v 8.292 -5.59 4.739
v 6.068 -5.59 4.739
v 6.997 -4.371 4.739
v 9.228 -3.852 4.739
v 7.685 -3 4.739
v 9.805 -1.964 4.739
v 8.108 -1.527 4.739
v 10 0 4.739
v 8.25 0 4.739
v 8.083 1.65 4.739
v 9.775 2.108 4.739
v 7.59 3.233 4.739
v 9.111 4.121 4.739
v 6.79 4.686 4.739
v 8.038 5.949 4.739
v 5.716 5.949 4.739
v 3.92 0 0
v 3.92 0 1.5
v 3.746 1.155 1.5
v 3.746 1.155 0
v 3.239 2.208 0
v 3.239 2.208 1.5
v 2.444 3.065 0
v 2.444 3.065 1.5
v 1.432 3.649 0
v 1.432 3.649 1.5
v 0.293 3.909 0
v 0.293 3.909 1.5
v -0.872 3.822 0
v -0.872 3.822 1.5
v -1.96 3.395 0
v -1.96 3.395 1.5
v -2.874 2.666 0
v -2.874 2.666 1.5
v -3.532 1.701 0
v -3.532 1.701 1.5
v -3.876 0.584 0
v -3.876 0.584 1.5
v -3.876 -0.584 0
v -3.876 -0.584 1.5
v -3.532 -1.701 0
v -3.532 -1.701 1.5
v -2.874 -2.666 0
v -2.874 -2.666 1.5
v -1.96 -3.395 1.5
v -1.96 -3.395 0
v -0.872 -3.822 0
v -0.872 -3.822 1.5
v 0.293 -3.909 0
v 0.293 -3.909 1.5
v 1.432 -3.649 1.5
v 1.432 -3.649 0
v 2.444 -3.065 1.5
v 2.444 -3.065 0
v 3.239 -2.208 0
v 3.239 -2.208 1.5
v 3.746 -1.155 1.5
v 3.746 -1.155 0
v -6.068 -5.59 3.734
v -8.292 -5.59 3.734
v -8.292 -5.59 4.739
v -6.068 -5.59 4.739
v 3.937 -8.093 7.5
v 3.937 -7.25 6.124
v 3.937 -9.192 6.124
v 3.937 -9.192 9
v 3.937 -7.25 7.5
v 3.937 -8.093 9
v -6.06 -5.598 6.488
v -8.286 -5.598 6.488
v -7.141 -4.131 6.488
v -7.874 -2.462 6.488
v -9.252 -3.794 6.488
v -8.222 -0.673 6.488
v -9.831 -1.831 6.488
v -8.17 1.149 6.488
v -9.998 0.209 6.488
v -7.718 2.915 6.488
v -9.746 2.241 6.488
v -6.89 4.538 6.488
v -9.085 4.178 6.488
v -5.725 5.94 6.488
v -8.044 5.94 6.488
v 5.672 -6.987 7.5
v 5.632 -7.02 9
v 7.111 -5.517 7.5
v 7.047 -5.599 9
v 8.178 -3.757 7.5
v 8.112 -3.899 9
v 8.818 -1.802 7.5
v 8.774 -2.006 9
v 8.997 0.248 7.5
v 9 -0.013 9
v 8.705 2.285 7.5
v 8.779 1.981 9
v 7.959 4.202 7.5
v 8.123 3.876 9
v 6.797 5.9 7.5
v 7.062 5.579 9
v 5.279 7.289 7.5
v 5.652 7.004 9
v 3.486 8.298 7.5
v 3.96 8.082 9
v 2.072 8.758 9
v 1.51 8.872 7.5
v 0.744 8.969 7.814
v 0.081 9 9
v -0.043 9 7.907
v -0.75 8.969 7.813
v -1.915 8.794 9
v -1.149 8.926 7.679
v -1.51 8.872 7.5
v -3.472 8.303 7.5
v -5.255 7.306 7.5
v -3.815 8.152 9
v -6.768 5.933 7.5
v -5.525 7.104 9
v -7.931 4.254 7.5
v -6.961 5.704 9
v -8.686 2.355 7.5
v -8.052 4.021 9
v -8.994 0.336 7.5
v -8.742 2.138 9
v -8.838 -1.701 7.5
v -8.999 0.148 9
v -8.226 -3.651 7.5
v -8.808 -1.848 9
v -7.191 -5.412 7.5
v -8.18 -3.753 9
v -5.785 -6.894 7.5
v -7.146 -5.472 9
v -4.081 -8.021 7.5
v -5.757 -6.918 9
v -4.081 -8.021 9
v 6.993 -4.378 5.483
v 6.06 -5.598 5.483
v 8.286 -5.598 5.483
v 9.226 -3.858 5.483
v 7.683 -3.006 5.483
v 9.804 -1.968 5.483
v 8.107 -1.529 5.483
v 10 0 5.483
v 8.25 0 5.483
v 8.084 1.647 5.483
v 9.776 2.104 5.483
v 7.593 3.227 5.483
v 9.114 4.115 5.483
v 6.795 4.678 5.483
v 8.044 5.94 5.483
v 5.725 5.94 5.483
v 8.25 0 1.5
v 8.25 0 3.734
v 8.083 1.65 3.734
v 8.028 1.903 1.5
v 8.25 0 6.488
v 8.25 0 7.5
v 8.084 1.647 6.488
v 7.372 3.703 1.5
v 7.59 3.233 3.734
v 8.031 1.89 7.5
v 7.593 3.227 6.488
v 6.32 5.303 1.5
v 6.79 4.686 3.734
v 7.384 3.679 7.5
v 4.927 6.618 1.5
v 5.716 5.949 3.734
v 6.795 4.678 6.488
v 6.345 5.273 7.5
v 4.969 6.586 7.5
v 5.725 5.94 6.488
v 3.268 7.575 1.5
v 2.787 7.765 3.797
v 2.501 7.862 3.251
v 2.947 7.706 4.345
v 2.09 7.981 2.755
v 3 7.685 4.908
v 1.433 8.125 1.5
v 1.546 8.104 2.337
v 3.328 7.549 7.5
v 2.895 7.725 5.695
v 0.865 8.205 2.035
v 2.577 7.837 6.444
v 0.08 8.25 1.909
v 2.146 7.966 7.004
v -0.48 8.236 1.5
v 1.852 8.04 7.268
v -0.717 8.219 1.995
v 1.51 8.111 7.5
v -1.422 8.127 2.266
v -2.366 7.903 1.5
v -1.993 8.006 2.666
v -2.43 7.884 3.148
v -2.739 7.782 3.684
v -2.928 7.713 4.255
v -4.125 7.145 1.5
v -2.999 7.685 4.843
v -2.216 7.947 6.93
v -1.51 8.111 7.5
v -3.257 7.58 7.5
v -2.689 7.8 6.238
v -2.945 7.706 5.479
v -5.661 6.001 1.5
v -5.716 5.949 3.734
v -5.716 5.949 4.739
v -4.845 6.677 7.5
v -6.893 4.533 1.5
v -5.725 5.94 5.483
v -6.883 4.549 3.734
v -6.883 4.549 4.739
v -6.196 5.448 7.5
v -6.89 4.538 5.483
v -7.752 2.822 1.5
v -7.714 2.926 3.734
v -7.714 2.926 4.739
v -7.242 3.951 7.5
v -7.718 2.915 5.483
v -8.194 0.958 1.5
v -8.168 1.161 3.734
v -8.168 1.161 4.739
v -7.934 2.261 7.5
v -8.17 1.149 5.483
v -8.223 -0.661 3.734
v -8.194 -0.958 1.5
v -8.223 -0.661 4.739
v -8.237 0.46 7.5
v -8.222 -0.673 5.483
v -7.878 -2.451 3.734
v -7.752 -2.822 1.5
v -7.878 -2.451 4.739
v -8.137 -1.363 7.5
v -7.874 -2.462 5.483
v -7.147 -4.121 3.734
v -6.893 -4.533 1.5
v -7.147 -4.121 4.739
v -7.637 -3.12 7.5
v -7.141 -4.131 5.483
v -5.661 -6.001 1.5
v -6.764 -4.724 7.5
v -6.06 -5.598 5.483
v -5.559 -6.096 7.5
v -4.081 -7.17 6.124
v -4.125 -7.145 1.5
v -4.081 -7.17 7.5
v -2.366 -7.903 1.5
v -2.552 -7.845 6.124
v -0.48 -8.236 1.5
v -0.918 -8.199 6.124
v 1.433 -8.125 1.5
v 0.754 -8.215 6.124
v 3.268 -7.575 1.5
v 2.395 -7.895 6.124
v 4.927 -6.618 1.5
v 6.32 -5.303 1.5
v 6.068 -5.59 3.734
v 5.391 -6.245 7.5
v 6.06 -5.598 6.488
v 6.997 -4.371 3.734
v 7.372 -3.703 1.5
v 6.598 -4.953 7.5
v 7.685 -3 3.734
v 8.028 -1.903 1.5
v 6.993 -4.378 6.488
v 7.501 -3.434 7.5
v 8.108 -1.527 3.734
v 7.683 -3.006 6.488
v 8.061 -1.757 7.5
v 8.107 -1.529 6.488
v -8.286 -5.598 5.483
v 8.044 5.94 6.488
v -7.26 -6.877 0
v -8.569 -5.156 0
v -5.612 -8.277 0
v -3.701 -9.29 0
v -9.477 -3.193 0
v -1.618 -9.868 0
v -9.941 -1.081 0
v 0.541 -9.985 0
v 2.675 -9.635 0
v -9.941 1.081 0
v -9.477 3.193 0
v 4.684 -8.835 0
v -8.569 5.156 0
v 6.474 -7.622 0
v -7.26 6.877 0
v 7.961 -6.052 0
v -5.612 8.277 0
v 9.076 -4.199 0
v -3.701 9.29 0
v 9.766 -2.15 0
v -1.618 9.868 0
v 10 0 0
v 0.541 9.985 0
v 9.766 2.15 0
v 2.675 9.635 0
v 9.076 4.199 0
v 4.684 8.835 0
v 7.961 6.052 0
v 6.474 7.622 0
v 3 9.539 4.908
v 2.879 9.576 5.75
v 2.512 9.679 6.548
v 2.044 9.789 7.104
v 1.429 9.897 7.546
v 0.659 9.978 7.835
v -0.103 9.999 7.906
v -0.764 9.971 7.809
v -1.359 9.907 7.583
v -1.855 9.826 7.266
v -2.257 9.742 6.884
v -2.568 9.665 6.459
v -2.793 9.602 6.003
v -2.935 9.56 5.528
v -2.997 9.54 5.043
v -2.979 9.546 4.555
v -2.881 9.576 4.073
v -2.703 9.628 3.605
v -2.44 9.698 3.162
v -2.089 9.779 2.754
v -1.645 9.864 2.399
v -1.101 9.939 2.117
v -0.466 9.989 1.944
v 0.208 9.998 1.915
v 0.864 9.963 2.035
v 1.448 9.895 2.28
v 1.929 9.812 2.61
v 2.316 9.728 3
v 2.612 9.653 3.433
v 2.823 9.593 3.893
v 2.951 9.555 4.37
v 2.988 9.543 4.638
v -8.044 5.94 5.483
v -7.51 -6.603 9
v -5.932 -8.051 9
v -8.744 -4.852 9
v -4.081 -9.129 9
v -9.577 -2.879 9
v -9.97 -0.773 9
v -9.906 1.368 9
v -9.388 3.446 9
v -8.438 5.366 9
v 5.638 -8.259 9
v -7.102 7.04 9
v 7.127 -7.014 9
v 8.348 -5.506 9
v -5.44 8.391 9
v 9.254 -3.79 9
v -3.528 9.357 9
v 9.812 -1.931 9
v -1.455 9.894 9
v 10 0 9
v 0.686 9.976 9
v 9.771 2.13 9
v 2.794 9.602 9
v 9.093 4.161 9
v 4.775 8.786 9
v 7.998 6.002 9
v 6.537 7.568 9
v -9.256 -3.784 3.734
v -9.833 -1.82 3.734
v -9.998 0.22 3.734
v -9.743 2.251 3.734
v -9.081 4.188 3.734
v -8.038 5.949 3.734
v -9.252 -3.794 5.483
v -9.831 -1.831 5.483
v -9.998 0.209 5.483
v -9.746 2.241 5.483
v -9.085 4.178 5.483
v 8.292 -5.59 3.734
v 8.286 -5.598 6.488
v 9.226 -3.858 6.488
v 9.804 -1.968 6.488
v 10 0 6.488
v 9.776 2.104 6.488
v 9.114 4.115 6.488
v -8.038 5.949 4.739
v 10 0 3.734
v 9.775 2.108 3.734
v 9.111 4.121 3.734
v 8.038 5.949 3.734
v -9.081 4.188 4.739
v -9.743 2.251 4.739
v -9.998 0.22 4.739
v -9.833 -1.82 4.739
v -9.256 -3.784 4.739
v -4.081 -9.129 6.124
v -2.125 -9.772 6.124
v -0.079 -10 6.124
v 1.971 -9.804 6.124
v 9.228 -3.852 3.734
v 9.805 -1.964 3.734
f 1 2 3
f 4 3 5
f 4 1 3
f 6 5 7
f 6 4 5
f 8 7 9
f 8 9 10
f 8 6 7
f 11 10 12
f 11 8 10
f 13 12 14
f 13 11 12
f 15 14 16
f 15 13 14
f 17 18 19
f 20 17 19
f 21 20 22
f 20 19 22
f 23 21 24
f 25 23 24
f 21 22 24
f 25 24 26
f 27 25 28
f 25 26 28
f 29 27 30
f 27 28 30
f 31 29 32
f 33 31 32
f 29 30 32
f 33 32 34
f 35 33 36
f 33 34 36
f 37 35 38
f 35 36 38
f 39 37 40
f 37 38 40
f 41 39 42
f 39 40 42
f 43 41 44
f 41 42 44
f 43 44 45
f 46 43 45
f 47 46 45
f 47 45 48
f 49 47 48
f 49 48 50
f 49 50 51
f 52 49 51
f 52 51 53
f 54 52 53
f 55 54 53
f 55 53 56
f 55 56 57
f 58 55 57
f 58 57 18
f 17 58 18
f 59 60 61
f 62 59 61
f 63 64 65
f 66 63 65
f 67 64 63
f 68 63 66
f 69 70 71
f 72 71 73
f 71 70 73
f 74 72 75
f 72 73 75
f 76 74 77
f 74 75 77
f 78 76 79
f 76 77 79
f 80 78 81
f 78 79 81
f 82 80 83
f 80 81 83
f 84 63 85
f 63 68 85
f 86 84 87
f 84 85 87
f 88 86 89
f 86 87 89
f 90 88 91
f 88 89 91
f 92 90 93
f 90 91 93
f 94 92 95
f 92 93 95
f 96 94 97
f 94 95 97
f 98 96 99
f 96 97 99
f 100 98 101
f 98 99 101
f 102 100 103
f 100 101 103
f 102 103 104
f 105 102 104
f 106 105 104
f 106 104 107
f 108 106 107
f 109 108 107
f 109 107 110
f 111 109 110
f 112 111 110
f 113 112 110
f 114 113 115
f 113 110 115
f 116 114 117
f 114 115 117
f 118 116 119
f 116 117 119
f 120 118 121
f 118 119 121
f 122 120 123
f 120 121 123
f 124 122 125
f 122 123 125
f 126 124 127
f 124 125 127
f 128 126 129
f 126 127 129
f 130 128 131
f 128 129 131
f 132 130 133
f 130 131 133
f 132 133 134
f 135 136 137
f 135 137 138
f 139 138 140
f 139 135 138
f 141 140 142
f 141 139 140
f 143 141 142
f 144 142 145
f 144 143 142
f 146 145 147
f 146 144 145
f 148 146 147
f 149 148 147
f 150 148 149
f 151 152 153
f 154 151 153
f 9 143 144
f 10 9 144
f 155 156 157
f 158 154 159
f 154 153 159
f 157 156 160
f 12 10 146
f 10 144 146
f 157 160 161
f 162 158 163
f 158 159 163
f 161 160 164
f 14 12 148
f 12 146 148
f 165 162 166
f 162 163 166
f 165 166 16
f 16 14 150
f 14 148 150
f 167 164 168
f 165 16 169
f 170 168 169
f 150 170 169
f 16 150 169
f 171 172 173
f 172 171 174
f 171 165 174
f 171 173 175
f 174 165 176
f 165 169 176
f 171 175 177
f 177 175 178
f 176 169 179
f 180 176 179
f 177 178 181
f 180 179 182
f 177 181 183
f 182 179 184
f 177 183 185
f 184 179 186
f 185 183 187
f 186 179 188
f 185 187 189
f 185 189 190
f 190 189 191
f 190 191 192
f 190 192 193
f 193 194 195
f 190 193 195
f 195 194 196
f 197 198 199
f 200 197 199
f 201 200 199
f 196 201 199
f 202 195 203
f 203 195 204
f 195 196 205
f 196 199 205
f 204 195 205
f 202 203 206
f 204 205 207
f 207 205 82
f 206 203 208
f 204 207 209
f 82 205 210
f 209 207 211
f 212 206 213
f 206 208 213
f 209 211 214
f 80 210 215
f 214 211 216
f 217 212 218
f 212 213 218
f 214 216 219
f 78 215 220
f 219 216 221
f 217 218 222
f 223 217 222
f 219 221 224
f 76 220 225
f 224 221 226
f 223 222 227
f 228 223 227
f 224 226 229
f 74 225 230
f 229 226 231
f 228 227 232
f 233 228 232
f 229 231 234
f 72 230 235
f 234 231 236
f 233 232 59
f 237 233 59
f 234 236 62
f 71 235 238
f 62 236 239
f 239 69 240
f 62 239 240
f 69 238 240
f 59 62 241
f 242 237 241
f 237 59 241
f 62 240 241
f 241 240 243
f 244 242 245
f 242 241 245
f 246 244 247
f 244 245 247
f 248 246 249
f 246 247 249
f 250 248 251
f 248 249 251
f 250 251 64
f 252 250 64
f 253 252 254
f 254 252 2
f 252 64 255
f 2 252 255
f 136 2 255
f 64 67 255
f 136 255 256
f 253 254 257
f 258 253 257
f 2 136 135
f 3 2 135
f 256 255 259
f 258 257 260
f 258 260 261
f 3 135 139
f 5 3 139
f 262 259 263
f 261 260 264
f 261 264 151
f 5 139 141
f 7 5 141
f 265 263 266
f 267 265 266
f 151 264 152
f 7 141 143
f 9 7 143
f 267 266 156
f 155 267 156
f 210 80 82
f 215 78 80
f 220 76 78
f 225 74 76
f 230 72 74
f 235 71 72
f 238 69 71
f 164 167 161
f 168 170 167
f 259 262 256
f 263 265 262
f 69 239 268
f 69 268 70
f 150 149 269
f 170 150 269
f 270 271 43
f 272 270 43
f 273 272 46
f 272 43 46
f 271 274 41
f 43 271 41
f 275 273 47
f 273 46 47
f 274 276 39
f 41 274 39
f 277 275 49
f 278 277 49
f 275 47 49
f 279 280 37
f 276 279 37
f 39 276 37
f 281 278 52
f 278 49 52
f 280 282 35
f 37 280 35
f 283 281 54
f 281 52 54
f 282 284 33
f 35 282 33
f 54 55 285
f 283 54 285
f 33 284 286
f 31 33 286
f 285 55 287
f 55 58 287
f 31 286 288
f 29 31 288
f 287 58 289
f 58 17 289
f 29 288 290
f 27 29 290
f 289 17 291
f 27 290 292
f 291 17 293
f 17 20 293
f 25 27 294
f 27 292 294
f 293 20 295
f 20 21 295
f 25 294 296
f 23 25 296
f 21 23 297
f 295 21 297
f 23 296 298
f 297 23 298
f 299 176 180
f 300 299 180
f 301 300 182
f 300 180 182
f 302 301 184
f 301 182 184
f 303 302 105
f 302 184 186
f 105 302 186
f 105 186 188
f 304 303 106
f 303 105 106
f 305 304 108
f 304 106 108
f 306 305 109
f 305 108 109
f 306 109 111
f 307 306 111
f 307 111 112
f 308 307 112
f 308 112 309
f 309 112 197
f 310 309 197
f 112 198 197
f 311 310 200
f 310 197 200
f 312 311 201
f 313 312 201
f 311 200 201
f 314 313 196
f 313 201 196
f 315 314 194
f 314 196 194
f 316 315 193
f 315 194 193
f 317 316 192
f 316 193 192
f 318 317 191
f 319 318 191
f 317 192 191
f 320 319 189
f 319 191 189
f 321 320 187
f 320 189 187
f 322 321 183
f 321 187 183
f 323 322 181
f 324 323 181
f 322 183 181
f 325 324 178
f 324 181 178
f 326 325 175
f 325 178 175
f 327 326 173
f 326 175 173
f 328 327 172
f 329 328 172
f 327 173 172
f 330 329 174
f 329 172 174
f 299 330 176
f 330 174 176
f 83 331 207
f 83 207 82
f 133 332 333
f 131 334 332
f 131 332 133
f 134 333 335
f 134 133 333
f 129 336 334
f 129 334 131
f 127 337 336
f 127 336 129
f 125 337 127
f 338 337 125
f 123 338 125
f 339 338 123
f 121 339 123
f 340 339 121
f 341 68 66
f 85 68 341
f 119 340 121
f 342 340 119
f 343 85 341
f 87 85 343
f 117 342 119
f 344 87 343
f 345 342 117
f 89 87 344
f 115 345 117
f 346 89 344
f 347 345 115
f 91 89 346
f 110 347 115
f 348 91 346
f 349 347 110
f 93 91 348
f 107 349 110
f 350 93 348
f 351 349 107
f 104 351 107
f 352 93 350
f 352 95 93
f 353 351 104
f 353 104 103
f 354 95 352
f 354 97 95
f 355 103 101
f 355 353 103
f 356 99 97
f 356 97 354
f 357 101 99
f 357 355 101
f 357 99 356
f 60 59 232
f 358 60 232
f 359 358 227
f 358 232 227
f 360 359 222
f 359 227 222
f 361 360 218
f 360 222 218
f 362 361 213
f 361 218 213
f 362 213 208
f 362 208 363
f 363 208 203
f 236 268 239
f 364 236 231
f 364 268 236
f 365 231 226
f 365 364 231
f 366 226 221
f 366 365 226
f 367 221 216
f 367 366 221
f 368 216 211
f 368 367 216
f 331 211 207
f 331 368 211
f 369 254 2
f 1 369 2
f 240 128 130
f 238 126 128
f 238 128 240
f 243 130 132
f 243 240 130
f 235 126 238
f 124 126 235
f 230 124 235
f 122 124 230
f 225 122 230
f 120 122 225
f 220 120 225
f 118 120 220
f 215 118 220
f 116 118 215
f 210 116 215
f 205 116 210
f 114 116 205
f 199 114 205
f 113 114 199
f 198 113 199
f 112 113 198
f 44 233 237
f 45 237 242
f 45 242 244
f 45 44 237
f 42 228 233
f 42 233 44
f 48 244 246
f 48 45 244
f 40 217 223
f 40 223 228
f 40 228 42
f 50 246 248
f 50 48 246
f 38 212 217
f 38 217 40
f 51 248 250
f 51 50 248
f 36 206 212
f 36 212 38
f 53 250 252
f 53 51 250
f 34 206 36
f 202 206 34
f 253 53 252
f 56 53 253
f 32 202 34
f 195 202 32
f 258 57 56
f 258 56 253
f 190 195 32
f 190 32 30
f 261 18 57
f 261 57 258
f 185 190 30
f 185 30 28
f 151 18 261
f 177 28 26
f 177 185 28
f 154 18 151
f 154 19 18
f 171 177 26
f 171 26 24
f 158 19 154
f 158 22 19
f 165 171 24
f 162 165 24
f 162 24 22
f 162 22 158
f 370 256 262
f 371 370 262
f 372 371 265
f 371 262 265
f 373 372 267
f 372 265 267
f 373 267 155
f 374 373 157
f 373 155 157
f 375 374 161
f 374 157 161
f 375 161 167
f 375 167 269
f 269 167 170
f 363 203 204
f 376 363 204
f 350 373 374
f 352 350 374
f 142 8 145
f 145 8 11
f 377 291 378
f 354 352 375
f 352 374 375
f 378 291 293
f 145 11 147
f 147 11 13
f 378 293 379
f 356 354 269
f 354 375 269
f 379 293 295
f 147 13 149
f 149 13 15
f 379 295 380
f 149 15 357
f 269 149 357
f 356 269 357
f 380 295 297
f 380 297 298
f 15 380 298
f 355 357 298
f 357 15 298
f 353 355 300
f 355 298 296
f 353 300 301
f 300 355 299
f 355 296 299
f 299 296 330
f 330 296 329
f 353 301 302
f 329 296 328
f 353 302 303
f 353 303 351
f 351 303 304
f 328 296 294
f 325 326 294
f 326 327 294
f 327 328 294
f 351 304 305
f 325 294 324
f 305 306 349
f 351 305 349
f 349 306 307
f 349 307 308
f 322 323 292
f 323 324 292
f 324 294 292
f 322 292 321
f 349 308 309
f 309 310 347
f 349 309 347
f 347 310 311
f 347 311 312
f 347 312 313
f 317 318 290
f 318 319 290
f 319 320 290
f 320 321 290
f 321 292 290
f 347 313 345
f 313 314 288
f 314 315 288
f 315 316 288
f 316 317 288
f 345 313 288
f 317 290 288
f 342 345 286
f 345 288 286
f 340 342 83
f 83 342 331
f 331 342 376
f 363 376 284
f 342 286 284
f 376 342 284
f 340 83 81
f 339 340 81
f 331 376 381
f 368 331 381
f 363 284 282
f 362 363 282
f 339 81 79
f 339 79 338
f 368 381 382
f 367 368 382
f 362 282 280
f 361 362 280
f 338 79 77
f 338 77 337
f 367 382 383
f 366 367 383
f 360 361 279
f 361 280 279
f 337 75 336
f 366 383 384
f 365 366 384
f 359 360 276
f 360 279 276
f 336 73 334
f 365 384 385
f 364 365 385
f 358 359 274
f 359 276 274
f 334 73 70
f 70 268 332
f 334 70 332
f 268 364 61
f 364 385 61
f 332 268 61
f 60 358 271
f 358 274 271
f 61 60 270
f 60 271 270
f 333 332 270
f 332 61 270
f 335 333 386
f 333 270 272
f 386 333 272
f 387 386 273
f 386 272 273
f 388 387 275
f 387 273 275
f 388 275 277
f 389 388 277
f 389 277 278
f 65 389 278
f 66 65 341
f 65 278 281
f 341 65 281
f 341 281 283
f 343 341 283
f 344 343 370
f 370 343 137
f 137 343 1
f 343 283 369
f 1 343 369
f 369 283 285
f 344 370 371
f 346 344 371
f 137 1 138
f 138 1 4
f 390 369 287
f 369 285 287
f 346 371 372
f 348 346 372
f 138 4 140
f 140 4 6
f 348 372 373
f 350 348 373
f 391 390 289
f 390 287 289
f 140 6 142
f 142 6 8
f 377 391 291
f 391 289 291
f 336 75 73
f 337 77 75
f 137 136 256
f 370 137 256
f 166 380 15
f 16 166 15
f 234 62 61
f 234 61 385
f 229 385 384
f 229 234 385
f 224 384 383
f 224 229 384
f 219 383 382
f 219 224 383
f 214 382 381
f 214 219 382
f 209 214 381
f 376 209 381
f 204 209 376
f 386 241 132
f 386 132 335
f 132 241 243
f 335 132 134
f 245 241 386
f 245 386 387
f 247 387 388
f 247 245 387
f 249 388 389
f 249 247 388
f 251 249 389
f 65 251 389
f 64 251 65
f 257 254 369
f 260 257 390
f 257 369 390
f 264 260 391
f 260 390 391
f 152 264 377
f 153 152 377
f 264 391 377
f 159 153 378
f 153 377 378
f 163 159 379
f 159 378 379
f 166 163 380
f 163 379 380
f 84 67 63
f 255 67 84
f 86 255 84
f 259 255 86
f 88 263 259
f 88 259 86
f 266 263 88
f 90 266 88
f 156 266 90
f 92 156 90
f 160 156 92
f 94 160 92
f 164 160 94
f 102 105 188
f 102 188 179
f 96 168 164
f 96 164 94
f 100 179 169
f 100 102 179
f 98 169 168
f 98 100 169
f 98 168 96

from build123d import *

# Parameters (mm, degrees)
F0_R      = 10
F1_DEPTH  = 9
F2_R      = 9
F3_DEPTH  = 1.5
F4_R      = 8.25
F5_DEPTH  = 6
F6_R      = 3.92
F7_DEPTH  = 1.501
F8_R      = 3
F9_DEPTH  = 10.001
F10_W     = 8.018549
F10_H     = 2.886699
F11_DEPTH = 25
F12_W     = 11.538846
F12_H     = 1.004787
F13_DEPTH = 25


with BuildPart() as f1:
    # F0 (on Top) → F1 (new body)
    with BuildSketch(Plane.XY):
        Circle(F0_R)
    extrude(amount=F1_DEPTH)

    # F2 (on face) → F3 (cut)
    with BuildSketch(Plane.XY.offset(9)):
        Circle(F2_R)
    extrude(amount=-F3_DEPTH, mode=Mode.SUBTRACT)

    # F4 (on face) → F5 (cut)
    with BuildSketch(Plane.XY.offset(7.5)):
        Circle(F4_R)
    extrude(amount=-F5_DEPTH, mode=Mode.SUBTRACT)

    # F6 (on face) → F7 (cut, through all)
    with BuildSketch(Plane.XY.offset(1.5)):
        Circle(F6_R)
    extrude(amount=-F7_DEPTH, mode=Mode.SUBTRACT)

    # F8 (on Front) → F9 (cut, through all)
    with BuildSketch(Plane.XZ):
        with Locations((0, 4.907787)):
            Circle(F8_R)
    extrude(amount=-F9_DEPTH, mode=Mode.SUBTRACT)

    # F10 (on Front) → F11 (cut)
    with BuildSketch(Plane.XZ):
        with Locations((-0.07208, 7.567474)):
            Rectangle(F10_W, F10_H)
    extrude(amount=F11_DEPTH, mode=Mode.SUBTRACT)

    # F12 (on Right) → F13 (cut, symmetric)
    with BuildSketch(Plane.YZ):
        with Locations((0.171022, 5.98548)):
            Rectangle(F12_W, F12_H)
        with Locations((0.179522, 4.236611)):
            Rectangle(F12_W, F12_H)
    extrude(amount=F13_DEPTH, both=True, mode=Mode.SUBTRACT)


solid = f1.part
